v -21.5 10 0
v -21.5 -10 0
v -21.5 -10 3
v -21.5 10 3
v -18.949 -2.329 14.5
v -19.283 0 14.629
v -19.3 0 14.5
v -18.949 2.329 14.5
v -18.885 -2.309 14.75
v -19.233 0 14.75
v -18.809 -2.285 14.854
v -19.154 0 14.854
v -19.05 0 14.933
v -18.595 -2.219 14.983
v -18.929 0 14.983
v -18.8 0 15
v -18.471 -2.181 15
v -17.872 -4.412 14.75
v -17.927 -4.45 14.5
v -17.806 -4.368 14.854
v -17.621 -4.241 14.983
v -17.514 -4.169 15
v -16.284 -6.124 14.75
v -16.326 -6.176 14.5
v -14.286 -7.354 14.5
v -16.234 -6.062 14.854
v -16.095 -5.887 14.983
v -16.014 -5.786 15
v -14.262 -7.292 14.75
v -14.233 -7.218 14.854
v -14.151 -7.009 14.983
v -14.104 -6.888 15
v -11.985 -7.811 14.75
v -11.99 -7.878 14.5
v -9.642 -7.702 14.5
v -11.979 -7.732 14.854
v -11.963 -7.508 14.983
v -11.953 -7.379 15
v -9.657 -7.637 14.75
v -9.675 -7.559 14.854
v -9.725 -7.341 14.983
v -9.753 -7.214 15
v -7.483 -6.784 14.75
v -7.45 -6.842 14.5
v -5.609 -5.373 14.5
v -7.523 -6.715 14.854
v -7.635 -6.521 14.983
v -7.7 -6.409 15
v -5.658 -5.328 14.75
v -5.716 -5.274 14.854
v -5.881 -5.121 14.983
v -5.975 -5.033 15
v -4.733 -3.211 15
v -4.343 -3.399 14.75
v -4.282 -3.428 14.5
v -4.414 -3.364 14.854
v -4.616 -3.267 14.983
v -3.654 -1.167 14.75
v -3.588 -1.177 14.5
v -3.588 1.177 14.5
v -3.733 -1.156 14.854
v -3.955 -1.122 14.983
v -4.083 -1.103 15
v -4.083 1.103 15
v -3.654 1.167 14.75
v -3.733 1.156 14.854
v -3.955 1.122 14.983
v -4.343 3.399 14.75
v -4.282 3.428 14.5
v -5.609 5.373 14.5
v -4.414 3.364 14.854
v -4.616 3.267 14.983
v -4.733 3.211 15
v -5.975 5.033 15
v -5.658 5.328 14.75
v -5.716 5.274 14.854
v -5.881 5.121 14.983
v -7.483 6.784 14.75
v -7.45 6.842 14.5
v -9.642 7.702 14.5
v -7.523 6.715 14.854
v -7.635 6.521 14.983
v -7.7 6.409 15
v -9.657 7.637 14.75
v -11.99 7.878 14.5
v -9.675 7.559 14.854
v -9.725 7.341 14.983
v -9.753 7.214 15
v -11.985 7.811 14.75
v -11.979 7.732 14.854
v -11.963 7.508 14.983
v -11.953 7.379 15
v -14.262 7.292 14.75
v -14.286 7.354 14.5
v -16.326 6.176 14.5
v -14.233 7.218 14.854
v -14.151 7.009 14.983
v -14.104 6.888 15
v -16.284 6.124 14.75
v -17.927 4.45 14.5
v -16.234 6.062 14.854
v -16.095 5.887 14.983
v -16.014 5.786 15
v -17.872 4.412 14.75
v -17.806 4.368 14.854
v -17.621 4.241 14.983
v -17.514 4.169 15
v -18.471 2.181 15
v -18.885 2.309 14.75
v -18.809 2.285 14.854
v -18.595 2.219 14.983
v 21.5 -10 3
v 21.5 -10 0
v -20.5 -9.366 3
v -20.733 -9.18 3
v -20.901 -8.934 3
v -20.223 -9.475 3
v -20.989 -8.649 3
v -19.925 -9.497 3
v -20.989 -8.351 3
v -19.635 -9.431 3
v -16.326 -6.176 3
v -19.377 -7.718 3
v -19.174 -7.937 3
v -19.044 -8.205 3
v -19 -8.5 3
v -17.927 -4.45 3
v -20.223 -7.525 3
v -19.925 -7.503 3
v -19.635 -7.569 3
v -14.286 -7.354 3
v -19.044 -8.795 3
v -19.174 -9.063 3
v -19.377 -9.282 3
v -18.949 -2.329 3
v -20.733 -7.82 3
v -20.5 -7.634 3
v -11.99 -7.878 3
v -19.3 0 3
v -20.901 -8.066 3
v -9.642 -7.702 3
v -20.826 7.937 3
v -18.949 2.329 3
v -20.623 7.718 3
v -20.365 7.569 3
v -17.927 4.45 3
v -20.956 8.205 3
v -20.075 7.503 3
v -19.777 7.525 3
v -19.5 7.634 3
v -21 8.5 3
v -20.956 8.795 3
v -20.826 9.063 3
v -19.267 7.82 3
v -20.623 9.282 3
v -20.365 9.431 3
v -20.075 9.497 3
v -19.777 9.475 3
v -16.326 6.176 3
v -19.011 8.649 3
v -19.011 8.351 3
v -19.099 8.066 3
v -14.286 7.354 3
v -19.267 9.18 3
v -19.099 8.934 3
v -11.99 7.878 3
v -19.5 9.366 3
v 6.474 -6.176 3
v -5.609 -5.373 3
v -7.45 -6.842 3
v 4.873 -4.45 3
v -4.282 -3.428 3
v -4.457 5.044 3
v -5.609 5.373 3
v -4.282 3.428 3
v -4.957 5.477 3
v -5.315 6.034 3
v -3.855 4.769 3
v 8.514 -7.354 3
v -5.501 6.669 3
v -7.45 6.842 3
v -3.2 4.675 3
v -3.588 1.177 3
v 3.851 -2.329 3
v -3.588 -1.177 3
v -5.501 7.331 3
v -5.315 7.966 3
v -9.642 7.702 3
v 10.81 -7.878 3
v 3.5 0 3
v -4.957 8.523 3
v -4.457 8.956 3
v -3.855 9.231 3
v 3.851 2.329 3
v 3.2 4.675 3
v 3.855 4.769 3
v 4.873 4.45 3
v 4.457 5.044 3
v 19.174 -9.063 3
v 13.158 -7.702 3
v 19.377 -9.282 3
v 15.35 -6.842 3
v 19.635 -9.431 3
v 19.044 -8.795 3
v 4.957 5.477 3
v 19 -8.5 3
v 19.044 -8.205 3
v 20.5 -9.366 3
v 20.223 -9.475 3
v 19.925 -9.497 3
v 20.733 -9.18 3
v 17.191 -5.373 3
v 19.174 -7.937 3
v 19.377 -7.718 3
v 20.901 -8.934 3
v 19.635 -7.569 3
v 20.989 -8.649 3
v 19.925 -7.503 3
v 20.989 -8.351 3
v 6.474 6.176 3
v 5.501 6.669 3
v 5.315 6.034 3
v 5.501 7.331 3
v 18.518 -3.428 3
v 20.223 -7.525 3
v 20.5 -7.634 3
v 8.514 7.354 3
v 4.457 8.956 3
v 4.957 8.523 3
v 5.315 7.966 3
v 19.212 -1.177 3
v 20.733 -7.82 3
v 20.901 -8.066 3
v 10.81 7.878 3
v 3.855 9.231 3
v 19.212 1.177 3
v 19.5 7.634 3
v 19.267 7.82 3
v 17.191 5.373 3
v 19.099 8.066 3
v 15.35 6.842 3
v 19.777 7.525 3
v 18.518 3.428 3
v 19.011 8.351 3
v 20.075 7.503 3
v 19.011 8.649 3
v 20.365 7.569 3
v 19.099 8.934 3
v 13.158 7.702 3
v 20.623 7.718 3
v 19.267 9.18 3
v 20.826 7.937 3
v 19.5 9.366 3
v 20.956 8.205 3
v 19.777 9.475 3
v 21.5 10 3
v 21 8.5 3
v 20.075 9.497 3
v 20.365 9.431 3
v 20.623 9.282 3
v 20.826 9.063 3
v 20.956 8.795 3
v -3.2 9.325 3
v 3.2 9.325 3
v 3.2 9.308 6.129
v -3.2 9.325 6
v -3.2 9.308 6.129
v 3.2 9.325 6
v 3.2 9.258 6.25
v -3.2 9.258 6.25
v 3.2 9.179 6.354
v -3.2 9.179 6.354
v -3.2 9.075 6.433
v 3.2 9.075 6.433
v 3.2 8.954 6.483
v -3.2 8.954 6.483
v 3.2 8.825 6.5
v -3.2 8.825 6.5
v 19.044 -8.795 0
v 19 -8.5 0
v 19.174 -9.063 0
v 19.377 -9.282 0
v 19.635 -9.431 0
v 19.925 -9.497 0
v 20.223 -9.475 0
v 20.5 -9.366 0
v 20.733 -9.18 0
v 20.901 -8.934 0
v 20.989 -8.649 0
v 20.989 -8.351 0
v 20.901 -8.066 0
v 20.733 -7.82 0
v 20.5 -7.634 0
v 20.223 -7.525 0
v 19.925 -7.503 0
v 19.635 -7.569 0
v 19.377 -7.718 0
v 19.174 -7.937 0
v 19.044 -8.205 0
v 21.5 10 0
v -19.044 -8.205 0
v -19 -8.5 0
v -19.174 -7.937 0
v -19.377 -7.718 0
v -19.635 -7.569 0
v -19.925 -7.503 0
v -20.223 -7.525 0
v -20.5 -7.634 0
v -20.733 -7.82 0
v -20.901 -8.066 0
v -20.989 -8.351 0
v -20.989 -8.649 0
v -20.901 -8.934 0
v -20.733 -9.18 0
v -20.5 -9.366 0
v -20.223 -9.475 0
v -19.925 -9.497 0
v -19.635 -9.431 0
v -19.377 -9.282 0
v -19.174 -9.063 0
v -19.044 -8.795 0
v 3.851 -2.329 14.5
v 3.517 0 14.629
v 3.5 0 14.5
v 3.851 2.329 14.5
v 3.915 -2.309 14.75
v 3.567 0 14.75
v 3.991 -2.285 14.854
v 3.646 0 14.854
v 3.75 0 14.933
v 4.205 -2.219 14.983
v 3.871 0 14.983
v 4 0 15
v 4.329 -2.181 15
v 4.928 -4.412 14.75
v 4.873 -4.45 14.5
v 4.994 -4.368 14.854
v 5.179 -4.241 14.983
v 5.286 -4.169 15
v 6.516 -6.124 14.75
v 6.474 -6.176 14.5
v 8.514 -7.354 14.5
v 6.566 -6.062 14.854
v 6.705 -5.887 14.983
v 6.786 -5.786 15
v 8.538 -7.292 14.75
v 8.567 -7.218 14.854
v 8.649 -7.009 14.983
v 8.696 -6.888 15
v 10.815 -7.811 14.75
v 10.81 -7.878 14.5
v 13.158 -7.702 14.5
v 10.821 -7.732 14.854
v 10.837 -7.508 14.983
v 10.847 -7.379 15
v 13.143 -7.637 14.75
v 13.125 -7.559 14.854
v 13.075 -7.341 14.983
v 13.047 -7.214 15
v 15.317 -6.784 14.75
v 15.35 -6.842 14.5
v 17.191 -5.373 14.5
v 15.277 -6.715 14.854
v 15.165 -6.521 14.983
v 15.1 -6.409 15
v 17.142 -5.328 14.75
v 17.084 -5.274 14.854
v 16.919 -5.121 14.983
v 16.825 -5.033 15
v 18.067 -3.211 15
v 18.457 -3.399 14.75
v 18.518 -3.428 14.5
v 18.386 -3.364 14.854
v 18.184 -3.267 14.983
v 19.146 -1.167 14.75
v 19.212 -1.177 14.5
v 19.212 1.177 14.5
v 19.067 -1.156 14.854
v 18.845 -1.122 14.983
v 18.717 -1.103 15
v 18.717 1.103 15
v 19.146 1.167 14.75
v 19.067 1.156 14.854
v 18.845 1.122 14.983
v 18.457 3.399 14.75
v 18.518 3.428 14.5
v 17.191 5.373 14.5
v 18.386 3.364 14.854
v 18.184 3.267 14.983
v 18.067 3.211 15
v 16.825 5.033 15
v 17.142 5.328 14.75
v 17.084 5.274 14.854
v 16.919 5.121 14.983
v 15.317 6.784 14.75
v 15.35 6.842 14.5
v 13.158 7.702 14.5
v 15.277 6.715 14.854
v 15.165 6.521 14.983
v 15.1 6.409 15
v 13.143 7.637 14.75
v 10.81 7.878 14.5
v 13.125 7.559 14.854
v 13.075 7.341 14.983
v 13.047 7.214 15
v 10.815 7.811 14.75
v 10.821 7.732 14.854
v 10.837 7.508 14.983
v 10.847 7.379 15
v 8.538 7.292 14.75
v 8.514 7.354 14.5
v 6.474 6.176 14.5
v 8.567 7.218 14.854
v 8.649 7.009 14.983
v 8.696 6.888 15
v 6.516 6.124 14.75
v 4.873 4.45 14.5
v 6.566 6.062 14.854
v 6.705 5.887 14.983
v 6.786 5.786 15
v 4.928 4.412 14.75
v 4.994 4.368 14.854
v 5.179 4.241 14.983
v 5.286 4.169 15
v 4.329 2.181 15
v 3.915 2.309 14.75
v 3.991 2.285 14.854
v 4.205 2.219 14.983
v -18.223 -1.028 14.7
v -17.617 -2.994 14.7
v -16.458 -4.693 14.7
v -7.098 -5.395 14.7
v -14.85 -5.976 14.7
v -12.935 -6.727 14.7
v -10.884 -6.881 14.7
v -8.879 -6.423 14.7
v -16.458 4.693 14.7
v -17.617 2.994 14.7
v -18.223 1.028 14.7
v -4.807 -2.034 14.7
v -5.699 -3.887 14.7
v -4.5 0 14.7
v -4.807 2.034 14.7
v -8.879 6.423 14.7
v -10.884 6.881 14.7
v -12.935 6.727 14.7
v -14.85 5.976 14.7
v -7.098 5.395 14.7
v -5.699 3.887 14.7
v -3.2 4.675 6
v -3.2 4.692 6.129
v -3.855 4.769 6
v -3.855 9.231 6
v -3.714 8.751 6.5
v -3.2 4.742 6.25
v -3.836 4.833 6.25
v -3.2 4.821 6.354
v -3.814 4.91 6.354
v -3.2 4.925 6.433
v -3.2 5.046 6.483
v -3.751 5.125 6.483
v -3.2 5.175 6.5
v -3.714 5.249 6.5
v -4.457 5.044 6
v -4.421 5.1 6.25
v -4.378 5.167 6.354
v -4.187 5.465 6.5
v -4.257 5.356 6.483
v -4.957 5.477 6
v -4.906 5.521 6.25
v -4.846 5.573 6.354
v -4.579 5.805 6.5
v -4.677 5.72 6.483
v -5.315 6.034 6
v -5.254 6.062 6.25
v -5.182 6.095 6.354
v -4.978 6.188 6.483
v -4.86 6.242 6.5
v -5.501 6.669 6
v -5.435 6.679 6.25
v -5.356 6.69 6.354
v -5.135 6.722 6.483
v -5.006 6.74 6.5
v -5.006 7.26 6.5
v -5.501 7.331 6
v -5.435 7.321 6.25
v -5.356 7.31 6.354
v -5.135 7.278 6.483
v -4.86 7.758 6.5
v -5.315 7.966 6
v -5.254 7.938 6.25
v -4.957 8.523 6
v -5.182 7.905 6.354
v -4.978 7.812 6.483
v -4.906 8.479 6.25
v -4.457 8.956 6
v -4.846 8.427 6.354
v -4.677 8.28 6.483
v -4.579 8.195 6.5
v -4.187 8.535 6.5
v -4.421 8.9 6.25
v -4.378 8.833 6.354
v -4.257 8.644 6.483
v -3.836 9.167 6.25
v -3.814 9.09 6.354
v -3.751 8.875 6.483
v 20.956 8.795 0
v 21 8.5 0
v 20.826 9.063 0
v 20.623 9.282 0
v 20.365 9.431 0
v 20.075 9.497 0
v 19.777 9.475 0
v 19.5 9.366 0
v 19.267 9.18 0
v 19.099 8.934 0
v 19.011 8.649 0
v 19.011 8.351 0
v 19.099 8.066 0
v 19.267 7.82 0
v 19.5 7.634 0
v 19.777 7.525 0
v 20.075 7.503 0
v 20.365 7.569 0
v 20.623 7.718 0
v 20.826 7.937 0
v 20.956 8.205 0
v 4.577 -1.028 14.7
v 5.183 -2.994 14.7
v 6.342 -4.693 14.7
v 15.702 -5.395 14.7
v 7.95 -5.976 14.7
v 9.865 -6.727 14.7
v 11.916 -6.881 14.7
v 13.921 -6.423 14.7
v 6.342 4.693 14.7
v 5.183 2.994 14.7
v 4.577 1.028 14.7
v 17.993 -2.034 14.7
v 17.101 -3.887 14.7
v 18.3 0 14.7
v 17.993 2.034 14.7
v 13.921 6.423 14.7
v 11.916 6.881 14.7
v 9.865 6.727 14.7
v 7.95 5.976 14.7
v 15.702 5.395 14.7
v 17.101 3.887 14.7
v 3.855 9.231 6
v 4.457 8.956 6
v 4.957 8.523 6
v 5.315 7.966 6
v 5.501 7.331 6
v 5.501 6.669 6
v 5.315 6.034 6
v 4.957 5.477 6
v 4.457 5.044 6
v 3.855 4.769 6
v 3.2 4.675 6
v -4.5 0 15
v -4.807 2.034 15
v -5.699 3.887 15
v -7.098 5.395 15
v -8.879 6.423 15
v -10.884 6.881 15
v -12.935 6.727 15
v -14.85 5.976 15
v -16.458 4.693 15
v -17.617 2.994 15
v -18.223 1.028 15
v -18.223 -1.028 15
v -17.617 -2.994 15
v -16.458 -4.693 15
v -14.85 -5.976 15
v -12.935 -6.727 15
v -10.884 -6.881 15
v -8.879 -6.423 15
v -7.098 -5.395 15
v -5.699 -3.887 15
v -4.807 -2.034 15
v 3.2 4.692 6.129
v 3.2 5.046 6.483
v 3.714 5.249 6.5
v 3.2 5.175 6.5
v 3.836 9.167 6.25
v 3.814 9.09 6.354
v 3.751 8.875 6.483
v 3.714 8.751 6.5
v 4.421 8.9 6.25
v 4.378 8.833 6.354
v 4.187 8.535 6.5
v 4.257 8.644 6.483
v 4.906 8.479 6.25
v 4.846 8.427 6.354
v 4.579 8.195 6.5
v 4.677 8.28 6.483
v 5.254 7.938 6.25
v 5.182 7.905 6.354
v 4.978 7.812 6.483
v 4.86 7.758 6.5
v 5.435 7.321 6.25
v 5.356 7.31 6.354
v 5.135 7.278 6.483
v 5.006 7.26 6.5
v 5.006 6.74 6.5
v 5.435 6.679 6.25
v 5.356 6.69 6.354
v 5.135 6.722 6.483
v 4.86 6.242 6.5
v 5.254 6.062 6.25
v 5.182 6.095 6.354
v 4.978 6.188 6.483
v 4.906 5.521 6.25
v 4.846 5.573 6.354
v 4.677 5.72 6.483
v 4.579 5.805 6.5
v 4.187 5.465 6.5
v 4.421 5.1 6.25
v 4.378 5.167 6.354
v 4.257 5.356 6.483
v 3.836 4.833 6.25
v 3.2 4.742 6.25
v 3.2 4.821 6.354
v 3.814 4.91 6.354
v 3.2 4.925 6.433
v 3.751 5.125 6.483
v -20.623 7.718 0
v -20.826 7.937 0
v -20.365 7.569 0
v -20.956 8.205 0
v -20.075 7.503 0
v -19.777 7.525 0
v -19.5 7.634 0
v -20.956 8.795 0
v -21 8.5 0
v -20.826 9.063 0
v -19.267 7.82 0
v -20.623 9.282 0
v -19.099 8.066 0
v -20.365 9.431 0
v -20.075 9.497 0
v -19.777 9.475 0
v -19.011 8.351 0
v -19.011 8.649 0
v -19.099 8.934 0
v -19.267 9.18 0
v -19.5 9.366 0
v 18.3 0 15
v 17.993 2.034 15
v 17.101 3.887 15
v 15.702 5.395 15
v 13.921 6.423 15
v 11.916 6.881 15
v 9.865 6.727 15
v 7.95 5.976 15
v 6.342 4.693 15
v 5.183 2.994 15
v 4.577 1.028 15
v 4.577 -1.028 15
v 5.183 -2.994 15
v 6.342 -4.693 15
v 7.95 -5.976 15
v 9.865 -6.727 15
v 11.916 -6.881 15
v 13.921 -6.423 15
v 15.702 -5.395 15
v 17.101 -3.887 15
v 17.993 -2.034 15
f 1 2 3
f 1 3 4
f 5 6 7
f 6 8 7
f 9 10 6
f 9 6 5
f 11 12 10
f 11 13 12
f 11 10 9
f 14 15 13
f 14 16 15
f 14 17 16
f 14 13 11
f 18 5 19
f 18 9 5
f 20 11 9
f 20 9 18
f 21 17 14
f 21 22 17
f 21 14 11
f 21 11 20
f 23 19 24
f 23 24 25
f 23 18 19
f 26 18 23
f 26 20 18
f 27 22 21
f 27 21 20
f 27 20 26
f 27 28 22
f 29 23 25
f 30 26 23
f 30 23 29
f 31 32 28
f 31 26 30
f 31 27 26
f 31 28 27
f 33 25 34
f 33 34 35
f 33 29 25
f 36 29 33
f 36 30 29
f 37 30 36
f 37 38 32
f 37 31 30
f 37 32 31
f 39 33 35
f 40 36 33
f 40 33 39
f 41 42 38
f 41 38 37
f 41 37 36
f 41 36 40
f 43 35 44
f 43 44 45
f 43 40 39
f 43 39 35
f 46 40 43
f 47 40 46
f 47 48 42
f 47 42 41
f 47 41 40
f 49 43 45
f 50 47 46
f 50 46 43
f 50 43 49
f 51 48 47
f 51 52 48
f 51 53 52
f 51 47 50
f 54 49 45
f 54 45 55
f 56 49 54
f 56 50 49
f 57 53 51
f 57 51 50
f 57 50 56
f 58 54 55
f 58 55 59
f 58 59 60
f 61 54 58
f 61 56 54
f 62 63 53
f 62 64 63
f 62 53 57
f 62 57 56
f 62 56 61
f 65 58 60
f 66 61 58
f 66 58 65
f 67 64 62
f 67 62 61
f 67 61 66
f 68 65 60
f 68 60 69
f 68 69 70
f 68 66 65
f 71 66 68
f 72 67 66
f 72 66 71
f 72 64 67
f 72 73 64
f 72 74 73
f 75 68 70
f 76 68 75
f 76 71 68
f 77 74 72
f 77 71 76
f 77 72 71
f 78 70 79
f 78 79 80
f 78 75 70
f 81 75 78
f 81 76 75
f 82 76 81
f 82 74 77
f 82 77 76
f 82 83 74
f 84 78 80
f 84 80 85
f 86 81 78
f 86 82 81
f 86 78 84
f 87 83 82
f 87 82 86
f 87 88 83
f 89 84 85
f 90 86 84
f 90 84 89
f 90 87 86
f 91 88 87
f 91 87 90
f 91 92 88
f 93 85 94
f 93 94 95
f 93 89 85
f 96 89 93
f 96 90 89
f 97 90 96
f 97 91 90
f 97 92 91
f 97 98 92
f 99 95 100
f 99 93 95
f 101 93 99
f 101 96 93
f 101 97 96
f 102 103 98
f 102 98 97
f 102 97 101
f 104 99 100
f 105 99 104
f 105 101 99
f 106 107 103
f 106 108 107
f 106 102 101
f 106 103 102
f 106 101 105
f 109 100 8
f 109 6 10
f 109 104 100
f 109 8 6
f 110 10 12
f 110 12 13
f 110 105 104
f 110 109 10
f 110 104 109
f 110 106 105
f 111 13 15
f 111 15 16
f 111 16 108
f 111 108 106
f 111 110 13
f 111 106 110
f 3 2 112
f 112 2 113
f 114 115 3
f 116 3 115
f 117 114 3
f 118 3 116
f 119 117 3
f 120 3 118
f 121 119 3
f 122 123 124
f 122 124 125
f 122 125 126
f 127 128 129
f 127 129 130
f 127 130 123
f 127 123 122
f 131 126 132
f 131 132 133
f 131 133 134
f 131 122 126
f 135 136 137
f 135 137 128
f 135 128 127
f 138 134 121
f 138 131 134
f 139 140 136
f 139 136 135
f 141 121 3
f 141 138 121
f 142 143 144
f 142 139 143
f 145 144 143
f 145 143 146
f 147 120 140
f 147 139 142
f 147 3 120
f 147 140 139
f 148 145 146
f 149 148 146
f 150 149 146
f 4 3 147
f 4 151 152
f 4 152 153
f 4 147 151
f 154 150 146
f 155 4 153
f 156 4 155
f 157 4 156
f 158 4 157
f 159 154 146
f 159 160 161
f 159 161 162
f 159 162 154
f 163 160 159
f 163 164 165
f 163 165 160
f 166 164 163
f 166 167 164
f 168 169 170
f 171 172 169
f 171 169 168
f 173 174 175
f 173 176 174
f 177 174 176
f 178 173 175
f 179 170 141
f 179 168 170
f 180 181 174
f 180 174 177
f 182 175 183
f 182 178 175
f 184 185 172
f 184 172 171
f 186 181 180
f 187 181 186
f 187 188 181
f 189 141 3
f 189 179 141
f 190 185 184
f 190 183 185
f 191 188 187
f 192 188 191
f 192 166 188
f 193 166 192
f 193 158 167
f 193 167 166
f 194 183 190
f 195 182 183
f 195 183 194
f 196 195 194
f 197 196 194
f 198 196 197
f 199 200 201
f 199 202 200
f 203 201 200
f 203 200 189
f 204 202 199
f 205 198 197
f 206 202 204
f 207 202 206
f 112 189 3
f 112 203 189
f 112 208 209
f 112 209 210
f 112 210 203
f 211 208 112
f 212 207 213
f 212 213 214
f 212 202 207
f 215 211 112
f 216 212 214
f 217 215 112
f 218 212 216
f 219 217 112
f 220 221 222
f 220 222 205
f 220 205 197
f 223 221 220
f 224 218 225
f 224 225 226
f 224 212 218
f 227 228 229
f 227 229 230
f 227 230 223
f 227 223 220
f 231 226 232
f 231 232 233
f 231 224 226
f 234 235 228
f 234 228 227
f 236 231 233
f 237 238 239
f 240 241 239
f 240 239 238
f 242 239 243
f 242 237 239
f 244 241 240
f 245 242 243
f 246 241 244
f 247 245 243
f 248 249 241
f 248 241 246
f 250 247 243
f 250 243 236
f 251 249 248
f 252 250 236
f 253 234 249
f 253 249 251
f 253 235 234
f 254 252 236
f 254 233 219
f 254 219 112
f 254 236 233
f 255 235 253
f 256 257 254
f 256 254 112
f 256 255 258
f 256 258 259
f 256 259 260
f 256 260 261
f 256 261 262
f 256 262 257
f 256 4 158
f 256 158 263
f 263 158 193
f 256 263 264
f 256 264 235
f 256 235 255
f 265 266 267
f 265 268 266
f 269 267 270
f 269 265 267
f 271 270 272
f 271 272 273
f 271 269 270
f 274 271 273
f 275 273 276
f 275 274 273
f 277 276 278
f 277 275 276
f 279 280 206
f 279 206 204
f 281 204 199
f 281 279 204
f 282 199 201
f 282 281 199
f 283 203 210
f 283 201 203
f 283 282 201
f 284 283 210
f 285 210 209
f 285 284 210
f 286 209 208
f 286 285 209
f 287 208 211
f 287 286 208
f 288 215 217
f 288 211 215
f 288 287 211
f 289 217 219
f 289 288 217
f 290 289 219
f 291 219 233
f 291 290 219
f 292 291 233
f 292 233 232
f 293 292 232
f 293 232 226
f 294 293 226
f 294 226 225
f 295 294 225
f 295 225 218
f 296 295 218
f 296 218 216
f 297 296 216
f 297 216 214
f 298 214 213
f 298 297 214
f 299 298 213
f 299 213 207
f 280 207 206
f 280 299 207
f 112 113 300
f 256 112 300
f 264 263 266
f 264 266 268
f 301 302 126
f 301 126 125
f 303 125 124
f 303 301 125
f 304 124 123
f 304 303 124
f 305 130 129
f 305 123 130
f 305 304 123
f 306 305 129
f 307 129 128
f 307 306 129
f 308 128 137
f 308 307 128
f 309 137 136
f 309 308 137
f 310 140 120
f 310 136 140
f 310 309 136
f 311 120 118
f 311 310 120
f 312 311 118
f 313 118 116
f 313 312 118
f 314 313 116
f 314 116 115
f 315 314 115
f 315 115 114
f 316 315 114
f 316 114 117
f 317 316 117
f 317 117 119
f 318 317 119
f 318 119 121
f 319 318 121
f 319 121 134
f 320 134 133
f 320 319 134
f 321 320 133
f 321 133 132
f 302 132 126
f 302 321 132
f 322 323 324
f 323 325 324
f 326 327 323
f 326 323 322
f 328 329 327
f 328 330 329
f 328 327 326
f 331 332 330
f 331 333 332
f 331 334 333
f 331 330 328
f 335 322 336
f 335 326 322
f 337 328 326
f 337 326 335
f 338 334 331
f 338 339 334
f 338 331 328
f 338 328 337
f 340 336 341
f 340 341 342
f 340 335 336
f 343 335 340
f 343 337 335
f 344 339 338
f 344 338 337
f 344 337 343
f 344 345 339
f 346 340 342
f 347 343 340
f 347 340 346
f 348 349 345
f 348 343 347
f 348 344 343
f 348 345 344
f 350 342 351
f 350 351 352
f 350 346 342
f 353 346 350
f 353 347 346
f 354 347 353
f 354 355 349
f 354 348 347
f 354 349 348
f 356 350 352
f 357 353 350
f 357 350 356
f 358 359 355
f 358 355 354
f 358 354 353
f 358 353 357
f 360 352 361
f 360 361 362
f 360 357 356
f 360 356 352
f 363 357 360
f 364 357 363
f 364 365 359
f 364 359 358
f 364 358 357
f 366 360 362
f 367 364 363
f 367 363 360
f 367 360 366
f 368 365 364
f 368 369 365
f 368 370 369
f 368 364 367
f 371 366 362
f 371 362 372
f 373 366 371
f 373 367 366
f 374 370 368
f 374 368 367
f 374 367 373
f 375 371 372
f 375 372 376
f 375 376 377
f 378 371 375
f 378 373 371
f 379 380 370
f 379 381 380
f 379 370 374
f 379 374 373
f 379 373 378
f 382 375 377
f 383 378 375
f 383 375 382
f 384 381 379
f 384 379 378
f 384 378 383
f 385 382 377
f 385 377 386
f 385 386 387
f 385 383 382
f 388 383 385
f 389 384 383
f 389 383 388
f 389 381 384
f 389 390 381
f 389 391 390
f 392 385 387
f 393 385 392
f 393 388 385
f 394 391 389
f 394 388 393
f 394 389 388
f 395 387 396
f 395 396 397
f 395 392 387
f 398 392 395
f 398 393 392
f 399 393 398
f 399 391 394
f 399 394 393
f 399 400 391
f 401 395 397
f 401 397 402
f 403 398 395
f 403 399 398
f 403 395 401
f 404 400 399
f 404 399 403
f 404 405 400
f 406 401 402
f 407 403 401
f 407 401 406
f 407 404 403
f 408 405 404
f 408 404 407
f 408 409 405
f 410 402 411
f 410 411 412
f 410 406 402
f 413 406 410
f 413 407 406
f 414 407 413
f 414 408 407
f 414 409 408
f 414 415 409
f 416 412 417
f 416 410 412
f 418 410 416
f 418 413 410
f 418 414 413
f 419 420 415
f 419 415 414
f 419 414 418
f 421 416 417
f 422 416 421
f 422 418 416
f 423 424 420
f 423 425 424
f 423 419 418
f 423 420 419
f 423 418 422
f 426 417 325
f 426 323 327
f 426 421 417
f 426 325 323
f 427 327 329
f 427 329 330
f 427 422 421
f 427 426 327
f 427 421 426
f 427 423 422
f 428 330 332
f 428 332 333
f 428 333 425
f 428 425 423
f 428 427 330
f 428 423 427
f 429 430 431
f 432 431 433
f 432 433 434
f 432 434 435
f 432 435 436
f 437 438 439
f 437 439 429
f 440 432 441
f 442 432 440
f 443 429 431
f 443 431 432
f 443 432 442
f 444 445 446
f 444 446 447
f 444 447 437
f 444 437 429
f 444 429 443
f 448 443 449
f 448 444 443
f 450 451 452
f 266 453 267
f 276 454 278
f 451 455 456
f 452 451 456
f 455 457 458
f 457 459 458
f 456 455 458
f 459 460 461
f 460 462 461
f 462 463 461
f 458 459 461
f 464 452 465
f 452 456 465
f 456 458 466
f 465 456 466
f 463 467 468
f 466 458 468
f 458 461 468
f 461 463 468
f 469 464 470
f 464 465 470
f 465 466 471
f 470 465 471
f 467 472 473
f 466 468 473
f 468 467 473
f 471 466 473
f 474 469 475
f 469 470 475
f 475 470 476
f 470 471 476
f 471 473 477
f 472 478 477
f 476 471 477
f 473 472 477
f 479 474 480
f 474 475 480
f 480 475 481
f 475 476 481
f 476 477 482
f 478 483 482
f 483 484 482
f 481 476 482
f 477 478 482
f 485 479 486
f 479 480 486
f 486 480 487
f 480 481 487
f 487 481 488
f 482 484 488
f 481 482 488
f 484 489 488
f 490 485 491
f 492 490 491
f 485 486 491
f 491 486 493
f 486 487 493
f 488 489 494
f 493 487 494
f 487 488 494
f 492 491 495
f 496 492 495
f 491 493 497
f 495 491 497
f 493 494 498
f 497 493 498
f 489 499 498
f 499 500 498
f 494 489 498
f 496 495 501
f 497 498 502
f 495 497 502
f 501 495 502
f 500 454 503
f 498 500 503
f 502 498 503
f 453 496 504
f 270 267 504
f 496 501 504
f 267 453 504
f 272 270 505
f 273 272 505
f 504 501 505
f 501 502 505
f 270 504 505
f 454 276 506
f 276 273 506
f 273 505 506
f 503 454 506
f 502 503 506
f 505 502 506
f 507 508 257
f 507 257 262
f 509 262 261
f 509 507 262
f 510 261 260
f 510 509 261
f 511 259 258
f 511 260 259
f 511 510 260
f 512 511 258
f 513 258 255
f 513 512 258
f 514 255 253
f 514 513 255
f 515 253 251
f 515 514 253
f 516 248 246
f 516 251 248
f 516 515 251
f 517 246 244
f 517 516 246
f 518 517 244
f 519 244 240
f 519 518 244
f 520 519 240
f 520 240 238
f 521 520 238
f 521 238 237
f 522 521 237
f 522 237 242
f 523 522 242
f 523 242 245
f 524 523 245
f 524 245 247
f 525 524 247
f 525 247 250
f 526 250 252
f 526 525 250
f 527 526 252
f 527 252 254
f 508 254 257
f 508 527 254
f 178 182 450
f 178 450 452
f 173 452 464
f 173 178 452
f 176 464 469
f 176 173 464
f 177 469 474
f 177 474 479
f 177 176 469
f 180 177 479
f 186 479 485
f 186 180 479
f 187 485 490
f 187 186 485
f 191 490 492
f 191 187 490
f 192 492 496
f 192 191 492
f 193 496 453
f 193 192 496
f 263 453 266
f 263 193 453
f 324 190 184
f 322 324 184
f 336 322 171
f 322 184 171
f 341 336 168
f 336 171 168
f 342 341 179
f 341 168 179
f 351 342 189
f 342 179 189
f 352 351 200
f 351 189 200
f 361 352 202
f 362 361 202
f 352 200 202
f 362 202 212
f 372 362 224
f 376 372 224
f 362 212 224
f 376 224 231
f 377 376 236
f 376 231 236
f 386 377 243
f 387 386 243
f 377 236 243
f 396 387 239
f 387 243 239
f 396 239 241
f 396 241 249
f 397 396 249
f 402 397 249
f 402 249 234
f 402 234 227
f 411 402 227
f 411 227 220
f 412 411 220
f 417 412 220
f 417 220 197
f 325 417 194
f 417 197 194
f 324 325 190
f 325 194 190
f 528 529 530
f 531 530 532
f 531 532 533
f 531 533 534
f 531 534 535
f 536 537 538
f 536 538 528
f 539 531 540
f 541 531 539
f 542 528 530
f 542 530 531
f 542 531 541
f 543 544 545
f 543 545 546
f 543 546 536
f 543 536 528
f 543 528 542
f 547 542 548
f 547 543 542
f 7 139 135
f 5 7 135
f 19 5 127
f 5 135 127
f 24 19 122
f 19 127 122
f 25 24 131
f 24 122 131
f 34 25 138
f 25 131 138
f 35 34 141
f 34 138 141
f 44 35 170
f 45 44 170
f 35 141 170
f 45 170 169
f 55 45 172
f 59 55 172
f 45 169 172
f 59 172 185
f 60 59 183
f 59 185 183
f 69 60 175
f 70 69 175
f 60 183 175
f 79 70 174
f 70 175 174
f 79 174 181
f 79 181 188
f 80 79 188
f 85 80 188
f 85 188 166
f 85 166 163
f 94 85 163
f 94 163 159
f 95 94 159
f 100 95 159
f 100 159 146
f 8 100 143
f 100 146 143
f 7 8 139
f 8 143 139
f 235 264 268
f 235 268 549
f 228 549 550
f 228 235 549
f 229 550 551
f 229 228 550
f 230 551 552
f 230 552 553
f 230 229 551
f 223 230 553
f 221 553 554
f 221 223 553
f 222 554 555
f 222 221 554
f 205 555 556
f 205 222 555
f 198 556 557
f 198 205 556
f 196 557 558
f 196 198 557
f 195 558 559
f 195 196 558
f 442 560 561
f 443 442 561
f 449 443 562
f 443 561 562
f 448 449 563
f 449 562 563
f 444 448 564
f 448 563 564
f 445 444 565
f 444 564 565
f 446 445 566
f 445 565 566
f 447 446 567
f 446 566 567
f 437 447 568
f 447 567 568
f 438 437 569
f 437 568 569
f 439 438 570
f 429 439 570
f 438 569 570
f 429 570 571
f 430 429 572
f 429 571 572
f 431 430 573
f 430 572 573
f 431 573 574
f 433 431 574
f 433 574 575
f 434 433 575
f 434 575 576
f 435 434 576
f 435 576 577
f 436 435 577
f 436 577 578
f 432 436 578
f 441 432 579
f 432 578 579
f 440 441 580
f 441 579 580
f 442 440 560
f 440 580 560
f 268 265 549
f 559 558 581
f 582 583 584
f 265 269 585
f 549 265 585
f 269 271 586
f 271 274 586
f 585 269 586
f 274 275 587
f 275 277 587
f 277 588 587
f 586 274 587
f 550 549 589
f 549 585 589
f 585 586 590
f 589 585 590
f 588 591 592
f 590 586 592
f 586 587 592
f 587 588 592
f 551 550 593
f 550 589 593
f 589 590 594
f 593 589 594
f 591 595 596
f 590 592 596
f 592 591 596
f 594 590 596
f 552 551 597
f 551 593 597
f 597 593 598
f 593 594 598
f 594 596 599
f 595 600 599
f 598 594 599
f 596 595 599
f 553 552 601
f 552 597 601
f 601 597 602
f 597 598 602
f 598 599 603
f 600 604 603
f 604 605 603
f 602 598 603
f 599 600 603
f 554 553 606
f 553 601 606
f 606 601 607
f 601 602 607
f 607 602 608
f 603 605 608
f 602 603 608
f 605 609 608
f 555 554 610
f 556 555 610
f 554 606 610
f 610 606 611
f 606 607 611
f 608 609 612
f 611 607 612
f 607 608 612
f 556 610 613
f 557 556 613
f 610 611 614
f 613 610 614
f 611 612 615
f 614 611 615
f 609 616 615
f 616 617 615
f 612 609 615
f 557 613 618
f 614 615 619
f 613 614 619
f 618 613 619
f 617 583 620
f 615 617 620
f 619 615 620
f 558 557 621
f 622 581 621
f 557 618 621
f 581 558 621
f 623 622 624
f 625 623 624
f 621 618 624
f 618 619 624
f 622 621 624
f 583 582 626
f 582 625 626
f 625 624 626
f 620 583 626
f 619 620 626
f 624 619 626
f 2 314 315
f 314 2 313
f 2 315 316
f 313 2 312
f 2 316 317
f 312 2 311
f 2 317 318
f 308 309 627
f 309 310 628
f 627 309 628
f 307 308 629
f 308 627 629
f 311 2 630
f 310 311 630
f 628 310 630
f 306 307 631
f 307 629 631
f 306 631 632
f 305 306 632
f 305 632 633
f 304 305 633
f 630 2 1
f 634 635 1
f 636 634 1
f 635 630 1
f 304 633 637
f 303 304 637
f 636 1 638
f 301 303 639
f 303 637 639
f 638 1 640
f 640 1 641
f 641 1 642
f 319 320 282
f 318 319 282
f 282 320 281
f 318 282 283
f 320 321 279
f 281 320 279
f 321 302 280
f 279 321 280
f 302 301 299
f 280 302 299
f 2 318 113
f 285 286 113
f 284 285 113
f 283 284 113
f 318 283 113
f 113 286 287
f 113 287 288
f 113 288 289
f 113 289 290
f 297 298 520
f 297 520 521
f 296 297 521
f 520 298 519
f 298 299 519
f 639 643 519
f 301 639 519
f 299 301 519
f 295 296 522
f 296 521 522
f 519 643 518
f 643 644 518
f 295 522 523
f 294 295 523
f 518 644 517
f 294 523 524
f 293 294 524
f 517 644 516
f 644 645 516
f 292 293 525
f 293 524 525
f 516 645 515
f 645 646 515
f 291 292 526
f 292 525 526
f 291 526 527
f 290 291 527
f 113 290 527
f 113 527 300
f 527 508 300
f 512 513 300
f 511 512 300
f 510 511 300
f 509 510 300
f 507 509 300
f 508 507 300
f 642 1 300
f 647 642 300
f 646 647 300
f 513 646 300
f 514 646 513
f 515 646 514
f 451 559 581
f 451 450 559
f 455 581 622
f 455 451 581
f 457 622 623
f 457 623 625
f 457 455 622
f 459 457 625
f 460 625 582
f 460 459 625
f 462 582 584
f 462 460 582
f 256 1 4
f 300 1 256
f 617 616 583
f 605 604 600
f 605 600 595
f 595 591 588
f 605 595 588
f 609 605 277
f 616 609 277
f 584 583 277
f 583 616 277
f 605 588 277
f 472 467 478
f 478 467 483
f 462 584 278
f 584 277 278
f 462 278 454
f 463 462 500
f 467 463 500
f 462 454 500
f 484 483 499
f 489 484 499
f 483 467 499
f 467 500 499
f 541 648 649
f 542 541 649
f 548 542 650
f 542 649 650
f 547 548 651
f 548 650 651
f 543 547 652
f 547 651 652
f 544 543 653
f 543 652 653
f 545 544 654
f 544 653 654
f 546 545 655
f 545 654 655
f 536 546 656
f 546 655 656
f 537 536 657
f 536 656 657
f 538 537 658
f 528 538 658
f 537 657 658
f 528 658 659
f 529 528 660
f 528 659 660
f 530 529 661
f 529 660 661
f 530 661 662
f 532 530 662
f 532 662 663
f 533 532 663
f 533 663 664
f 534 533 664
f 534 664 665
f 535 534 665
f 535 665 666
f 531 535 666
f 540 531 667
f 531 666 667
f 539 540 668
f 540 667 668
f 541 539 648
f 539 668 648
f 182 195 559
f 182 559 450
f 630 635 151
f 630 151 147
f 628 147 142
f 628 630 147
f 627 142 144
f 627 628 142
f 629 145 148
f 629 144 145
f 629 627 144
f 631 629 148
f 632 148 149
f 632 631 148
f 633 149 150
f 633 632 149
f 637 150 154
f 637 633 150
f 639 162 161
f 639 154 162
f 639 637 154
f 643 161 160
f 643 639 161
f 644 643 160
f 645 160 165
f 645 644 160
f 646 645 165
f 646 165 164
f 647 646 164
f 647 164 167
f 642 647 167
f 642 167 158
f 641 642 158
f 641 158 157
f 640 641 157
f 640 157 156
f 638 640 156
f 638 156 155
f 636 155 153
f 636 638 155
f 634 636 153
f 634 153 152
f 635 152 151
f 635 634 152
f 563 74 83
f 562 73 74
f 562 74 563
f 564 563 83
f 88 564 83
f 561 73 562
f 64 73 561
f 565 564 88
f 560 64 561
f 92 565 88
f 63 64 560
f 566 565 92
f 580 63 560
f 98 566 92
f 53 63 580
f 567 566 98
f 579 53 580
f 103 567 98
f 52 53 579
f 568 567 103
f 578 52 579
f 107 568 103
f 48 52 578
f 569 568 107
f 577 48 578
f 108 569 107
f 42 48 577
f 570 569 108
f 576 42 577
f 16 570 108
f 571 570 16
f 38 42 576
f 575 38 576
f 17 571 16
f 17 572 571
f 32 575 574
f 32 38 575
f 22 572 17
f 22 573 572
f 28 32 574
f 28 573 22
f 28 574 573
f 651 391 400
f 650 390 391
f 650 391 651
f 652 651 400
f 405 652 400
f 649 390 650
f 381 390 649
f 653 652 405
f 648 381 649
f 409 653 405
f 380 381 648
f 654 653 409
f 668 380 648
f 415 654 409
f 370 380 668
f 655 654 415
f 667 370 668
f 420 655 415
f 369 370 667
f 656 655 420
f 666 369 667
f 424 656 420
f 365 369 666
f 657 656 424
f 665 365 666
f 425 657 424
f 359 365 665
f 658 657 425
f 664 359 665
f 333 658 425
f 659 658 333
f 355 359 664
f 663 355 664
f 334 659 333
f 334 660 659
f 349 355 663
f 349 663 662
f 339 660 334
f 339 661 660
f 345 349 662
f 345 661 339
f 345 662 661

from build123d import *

# Parameters (mm, degrees)
SKETCH_1_W               = 43
SKETCH_1_H               = 20
EXTRUDE_1_DEPTH          = 3
CUT_EXTRUDE_1_DEPTH      = 24.900836805
CUT_EXTRUDE_1_DEPTH_BACK = 24.900836805
SKETCH_2_R               = 1
SKETCH_3_R               = 7.9
EXTRUDE_2_DEPTH          = 12
FILLET_1_R               = 0.5
SKETCH_5_R               = 6.9
CUT_EXTRUDE_2_DEPTH      = 0.3
EXTRUDE_3_DEPTH          = 3.5
FILLET_2_R               = 0.5


with BuildPart() as part:
    # 스케치1 → 보스-돌출1 (new body)
    with BuildSketch(Plane.XY):
        Rectangle(SKETCH_1_W, SKETCH_1_H)
    extrude(amount=EXTRUDE_1_DEPTH)

    # 스케치2 → 컷-돌출1 (cut, two sides: drawn at the far end of the back side and taken through both)
    with BuildSketch(Plane.XY.offset(3).offset(-CUT_EXTRUDE_1_DEPTH_BACK)):
        with Locations((20, 8.5)):
            Circle(SKETCH_2_R)
        with Locations(Location((-20, 8.5, 0), (0, 0, 180))):
            Circle(SKETCH_2_R)
        with Locations(Location((20, -8.5, 0), (0, 0, 180))):
            Circle(SKETCH_2_R)
        with Locations((-20, -8.5)):
            Circle(SKETCH_2_R)
    extrude(amount=CUT_EXTRUDE_1_DEPTH + CUT_EXTRUDE_1_DEPTH_BACK, mode=Mode.SUBTRACT)

    # 스케치3 → 보스-돌출2 (add)
    with BuildSketch(Plane.XY.offset(3)):
        with Locations(Location((11.4, 0, 0), (0, 0, 180))):
            Circle(SKETCH_3_R)
        with Locations(Location((-11.4, 0, 0), (0, 0, 180))):
            Circle(SKETCH_3_R)
    extrude(amount=EXTRUDE_2_DEPTH)

    # 필렛1
    fillet_1_edges = [part.edges().sort_by_distance(p)[0] for p in [
        (19.3, 0, 15),
        (-3.5, 0, 15),
    ]]
    fillet(fillet_1_edges, radius=FILLET_1_R)

    # 스케치5 → 컷-돌출2 (cut)
    with BuildSketch(Plane.XY.offset(15)):
        with Locations((-11.4, 0)):
            Circle(SKETCH_5_R)
        with Locations((11.4, 0)):
            Circle(SKETCH_5_R)
    extrude(amount=-CUT_EXTRUDE_2_DEPTH, mode=Mode.SUBTRACT)

    # 스케치6 → 보스-돌출3 (add)
    with BuildSketch(Plane.XY.offset(3)):
        with BuildLine():
            Line((-3.2, 9.325), (3.2, 9.325))
            ThreePointArc((3.2, 9.325), (5.525, 7), (3.2, 4.675))
            Line((3.2, 4.675), (-3.2, 4.675))
            ThreePointArc((-3.2, 4.675), (-5.525, 7), (-3.2, 9.325))
        make_face()
    extrude(amount=EXTRUDE_3_DEPTH)

    # 필렛2
    fillet_2_edges = [part.edges().sort_by_distance(p)[0] for p in [
        (-5.525, 7, 6.5),
        (0, 4.675, 6.5),
        (5.525, 7, 6.5),
        (0, 9.325, 6.5),
    ]]
    fillet(fillet_2_edges, radius=FILLET_2_R)


solid = part.part
